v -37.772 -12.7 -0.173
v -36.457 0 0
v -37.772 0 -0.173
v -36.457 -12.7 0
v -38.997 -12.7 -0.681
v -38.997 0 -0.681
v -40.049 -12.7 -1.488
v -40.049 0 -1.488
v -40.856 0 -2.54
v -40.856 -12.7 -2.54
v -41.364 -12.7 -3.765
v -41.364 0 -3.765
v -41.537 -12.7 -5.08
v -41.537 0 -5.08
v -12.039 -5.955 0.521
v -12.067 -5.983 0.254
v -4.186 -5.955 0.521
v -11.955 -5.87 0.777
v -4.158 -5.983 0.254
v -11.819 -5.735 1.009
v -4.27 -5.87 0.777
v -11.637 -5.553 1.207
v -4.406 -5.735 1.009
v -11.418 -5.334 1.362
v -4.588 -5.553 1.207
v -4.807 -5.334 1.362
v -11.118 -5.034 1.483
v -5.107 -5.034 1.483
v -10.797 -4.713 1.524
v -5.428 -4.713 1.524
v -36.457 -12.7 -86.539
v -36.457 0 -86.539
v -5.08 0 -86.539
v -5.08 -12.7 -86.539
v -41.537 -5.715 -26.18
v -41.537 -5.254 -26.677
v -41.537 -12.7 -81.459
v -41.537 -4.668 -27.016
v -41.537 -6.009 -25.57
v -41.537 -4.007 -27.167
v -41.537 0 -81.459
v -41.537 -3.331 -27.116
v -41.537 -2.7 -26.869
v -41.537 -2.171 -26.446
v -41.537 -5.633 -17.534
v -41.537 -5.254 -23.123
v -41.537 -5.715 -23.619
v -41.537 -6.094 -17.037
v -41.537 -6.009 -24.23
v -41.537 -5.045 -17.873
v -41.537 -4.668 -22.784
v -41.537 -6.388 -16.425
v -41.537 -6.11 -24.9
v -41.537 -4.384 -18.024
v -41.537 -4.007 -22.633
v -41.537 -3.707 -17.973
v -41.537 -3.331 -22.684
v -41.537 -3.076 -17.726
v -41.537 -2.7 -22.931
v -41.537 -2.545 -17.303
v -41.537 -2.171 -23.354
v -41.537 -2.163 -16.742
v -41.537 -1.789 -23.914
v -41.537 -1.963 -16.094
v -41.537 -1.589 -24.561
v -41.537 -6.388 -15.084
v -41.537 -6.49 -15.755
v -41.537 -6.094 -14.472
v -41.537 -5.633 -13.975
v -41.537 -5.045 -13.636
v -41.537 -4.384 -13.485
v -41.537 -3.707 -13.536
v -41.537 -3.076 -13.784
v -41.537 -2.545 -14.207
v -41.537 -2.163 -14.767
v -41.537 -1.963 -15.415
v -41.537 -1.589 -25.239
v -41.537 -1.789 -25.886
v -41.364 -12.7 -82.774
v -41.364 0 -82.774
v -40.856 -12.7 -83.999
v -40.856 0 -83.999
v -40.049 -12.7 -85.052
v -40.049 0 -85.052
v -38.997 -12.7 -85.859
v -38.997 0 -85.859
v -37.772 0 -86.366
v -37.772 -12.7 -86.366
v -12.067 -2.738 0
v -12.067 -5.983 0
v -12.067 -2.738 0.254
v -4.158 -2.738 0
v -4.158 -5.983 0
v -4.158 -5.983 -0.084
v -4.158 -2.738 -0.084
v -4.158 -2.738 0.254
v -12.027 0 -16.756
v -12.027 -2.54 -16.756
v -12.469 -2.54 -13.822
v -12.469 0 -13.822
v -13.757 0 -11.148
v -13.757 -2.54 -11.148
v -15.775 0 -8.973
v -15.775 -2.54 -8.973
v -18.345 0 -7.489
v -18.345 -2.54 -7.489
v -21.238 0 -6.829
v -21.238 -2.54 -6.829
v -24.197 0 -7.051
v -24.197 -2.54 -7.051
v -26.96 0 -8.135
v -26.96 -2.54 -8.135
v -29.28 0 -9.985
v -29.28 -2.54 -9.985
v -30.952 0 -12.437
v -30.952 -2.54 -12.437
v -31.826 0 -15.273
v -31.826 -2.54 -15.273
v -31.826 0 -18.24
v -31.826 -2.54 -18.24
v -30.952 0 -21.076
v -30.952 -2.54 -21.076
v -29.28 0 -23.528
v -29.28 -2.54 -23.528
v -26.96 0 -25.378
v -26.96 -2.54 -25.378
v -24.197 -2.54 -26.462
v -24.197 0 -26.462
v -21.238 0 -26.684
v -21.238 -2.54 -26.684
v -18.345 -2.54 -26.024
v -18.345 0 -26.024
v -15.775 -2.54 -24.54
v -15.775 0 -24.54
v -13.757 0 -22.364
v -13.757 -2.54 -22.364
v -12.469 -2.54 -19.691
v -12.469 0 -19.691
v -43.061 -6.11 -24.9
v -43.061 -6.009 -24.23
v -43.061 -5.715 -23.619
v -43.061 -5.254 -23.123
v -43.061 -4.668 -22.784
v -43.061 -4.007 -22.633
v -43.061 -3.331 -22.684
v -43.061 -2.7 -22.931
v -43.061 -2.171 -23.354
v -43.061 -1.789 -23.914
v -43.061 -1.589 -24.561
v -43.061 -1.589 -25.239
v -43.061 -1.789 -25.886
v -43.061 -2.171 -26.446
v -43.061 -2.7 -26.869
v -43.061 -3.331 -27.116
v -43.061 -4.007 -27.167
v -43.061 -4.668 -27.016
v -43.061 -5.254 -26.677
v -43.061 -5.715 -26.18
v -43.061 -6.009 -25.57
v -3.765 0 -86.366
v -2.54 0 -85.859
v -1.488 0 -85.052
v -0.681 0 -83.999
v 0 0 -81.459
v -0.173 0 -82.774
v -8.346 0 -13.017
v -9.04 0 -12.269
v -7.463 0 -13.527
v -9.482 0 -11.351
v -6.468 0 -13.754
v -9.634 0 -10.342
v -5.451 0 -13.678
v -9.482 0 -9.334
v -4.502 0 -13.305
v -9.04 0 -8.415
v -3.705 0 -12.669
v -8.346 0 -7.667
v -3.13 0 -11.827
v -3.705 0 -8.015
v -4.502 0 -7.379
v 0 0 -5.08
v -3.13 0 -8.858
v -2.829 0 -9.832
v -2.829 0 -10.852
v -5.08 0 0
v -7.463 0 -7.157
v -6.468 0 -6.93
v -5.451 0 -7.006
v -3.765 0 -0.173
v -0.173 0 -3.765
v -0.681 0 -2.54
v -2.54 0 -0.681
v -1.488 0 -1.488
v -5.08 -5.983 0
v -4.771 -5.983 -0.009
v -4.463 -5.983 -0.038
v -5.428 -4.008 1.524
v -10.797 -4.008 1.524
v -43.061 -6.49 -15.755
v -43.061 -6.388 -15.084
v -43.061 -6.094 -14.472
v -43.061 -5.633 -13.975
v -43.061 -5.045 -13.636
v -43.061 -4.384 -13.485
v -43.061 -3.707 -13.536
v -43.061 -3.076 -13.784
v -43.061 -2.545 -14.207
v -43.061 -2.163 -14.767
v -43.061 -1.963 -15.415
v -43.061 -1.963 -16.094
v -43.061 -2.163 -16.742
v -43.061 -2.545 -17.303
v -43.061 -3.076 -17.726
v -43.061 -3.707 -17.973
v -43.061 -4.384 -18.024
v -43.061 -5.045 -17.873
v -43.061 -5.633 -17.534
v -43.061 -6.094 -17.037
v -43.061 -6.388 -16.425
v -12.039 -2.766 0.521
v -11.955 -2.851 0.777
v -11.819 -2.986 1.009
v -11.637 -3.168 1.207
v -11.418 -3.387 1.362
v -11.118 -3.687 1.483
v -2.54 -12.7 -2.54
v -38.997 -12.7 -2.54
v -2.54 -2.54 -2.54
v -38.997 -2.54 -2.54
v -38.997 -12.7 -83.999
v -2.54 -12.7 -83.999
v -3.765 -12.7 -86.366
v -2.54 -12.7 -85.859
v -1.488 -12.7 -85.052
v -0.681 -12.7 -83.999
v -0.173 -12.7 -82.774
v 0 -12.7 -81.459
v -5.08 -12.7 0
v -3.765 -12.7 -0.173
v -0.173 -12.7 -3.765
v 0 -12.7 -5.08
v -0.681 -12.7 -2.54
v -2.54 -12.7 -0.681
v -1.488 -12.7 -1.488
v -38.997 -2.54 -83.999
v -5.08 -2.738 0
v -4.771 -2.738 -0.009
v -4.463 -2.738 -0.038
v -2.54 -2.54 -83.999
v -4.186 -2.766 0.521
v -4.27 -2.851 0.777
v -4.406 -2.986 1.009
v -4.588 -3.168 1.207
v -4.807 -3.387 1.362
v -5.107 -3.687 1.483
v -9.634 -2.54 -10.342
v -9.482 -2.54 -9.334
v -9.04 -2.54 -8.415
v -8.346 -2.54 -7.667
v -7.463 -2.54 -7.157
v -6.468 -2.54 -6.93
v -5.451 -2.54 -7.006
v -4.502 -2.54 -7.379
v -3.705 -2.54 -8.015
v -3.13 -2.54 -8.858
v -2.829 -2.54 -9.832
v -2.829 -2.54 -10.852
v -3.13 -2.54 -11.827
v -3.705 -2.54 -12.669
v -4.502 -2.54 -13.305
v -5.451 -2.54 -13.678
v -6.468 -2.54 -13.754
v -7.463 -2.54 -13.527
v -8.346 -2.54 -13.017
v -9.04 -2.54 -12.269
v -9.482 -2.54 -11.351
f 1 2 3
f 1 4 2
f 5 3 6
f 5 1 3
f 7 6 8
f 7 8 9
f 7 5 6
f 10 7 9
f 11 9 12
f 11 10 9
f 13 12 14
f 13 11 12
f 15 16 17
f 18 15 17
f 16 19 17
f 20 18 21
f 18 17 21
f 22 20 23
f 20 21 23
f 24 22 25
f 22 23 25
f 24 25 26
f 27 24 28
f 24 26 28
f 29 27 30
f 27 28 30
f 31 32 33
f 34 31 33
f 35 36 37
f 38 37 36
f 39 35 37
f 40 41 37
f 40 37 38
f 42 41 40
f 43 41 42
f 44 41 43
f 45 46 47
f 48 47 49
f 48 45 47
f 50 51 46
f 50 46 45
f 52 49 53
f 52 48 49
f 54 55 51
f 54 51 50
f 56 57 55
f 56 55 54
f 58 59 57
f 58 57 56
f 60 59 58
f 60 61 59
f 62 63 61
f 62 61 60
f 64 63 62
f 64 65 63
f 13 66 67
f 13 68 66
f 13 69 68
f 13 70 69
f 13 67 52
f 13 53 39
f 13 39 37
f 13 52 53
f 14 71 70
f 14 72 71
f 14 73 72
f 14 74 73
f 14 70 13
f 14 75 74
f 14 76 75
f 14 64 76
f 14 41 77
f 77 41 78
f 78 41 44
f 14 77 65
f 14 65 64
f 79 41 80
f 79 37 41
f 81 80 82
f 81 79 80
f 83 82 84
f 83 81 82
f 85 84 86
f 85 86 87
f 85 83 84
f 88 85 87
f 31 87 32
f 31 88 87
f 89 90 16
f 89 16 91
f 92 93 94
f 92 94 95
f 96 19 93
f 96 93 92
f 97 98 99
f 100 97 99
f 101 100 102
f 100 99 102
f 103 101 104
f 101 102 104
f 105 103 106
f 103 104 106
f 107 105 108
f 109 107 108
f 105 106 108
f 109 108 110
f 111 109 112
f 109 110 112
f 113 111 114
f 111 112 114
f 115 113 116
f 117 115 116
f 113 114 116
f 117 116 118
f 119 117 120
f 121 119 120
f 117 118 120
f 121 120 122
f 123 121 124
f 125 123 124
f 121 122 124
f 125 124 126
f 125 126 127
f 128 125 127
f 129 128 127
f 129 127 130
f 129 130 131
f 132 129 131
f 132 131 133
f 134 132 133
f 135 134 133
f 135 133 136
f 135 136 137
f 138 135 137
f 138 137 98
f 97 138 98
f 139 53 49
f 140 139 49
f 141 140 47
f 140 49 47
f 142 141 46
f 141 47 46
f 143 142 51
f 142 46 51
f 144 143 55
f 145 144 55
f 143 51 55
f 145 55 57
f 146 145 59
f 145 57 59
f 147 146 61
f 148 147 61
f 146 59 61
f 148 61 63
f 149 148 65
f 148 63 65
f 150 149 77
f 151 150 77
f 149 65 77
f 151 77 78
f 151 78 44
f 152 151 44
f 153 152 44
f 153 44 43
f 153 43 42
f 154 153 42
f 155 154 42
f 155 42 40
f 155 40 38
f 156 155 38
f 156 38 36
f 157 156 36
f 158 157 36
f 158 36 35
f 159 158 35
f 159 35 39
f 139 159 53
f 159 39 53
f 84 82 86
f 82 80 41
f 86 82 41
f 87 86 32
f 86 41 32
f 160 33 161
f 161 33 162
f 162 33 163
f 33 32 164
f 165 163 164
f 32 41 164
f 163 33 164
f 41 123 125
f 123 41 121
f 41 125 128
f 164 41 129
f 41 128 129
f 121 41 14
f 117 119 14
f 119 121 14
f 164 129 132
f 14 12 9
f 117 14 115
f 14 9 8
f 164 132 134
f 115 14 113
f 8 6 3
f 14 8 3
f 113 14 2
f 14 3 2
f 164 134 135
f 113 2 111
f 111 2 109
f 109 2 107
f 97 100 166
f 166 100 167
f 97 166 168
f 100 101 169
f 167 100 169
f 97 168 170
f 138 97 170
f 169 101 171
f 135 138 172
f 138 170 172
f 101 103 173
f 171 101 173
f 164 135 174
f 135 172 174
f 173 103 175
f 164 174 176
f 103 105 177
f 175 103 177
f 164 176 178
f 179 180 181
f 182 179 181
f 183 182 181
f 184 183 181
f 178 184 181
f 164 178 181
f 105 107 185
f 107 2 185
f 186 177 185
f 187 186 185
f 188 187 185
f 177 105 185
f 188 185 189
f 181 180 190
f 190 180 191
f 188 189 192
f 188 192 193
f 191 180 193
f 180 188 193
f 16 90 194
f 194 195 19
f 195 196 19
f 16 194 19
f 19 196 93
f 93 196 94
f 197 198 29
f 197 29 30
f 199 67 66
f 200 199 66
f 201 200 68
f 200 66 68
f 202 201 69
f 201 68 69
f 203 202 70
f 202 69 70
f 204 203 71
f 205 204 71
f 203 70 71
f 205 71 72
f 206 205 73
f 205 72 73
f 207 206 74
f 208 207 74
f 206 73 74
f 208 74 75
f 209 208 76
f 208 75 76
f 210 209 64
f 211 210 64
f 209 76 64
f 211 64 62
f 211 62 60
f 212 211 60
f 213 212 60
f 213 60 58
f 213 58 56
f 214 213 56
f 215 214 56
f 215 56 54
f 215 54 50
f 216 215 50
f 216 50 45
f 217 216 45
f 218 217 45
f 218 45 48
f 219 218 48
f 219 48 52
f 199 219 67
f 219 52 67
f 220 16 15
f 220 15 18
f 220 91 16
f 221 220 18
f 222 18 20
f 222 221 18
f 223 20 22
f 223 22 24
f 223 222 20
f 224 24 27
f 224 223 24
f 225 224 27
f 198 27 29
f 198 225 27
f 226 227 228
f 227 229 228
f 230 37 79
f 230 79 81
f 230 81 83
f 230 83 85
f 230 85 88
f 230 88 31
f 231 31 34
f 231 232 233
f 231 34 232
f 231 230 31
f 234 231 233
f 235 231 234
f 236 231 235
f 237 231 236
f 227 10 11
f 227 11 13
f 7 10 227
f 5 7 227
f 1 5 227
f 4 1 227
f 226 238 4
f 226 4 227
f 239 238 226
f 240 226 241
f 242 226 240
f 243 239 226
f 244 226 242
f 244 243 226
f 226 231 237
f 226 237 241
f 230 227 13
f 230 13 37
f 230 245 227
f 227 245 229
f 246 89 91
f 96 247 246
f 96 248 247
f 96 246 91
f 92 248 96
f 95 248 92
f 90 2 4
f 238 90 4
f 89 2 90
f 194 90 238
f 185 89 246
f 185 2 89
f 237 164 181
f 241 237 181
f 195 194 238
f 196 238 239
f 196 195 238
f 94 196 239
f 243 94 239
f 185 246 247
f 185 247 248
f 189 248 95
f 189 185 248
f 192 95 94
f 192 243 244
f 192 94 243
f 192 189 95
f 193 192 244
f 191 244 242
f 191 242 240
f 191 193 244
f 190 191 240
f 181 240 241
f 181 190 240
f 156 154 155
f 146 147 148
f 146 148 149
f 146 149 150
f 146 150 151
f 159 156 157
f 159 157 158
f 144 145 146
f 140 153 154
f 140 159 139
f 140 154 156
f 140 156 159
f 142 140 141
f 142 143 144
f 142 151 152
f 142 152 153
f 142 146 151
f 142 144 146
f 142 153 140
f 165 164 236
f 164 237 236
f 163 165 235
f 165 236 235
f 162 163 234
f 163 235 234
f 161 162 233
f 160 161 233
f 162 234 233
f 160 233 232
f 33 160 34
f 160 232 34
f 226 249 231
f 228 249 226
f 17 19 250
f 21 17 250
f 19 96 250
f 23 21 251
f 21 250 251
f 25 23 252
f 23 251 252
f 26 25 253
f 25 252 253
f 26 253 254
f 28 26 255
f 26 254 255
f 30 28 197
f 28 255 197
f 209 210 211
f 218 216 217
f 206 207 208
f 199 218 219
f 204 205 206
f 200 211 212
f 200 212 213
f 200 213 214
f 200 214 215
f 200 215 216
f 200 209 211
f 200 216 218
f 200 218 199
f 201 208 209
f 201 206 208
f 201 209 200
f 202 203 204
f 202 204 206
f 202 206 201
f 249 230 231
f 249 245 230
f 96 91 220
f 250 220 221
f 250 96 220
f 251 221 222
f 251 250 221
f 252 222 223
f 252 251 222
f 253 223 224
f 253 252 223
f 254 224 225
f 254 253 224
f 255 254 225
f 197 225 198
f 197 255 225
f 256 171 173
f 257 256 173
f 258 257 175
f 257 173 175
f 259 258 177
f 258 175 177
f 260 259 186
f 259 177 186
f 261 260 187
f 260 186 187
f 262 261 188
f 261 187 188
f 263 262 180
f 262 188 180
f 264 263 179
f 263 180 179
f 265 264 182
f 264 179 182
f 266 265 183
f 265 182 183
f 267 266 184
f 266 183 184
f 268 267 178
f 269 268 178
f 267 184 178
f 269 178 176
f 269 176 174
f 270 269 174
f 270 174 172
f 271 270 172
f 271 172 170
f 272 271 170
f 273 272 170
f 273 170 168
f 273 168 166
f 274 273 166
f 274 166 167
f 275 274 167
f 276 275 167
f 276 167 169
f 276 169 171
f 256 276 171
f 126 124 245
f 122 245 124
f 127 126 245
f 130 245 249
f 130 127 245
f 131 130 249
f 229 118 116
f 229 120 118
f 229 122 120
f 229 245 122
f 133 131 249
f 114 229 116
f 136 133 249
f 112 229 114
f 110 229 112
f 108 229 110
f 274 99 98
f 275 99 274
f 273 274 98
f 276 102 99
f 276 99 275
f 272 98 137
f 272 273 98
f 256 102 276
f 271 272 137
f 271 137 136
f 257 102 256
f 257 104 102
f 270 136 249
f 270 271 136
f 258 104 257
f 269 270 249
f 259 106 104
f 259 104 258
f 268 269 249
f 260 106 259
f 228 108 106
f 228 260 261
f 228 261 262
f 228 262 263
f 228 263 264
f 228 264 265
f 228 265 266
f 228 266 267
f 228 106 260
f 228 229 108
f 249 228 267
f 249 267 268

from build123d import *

# Parameters (mm, degrees)
F0_W          = 41.536912322
F0_H          = 86.5394547582
F1_DEPTH      = 12.7
F2_T          = -2.54
F3_R          = 2.2759132083
F5_DEPTH      = 1.524
F4_R          = 2.2733
F6_DEPTH      = 1.524
F7_W          = 7.9097328708
F7_H          = 3.2450191211
F8_DEPTH      = 1.524
F9_R          = 1.27
F10_R         = 5.08
F11_R         = 5.08
F12_T4_DEPTH  = 38.1
F12_T10_DEPTH = 38.1
F12_T16_DEPTH = 38.1
F12_T23_DEPTH = 38.1
F12_T29_DEPTH = 38.1
F13_R         = 5.08
F14_R         = 3.4214532803
F15_DEPTH     = 37.77729
F16_R         = 9.955312615
F17_DEPTH     = 26.73123


# Not quite as in the source:
# - a fillet or chamfer that OpenCascade refuses, or shapes differently, is made with other operations: its cross-section is extruded or revolved along the edge and cut away or added


with BuildPart() as f1:
    # F0 (on Front) → F1 (new body)
    with BuildSketch(Plane.XZ):
        with Locations((-20.768456161, -43.2697273791)):
            Rectangle(F0_W, F0_H)
    extrude(amount=F1_DEPTH)

    # F2
    f2_openings = [f1.faces().sort_by_distance(p)[0] for p in [
        (-20.768456, -12.7, -43.269727),
    ]]
    offset(amount=F2_T, openings=f2_openings)

    # F3 (on face) → F5 (join)
    with BuildSketch(Plane(origin=(-41.536912322, 0, 0), x_dir=(0, -1, 0), z_dir=(-1, 0, 0))):
        with Locations((4.2136539705, -15.7545246184)):
            Circle(F3_R)
    extrude(amount=F5_DEPTH)

    # F4 (on face) → F6 (join)
    with BuildSketch(Plane(origin=(-41.536912322, 0, 0), x_dir=(0, -1, 0), z_dir=(-1, 0, 0))):
        with Locations((3.8371200208, -24.8998850584)):
            Circle(F4_R)
    extrude(amount=F6_DEPTH)

    # F7 (on face) → F8 (join)
    with BuildSketch(Plane.XY):
        with Locations((-8.1125465222, -4.3604943203)):
            Rectangle(F7_W, F7_H)
    extrude(amount=F8_DEPTH)

    # F9
    f9_edges = [f1.edges().sort_by_distance(p)[0] for p in [
        (-8.112547, -2.737985, 1.524),
        (-12.067413, -4.360494, 1.524),
        (-8.112547, -5.983004, 1.524),
        (-4.15768, -4.360494, 1.524),
    ]]
    fillet(f9_edges, radius=F9_R)

    # F10
    f10_edges = [f1.edges().sort_by_distance(p)[0] for p in [
        (-41.536912, -6.35, 0),
    ]]
    fillet(f10_edges, radius=F10_R)

    # F11
    f11_edges = [f1.edges().sort_by_distance(p)[0] for p in [
        (-41.536912, -6.35, -86.539455),
    ]]
    fillet(f11_edges, radius=F11_R)

    # F12: fillet of radius 5.08 on 1 edges, made by hand


with BuildPart() as f12_tool2:
    # F12_s3 → F12_t4 (new body)
    with BuildSketch(Plane.XZ.offset(-12.7)):
        with BuildLine():
            ThreePointArc((-5.08, 0), (-1.4878975516, -1.4878975516), (0, -5.08))
            Line((0, -5.08), (0, 0))
            Line((0, 0), (-5.08, 0))
        make_face()
    extrude(amount=F12_T4_DEPTH)

    split(bisect_by=Plane.YZ.offset(-4.1576800868), keep=Keep.BOTTOM)

    split(bisect_by=Plane.XZ.offset(2.7379847597), keep=Keep.BOTTOM)


with BuildPart() as f1_1:
    add(f1.part)

    # F12_t1: cut F12_tool2
    add(f12_tool2.part, mode=Mode.SUBTRACT)


with BuildPart() as f12_tool8:
    # F12_s9 → F12_t10 (new body)
    with BuildSketch(Plane.XZ.offset(-12.7)):
        with BuildLine():
            ThreePointArc((-5.08, 0), (-1.4878975516, -1.4878975516), (0, -5.08))
            Line((0, -5.08), (0, 0))
            Line((0, 0), (-5.08, 0))
        make_face()
    extrude(amount=F12_T10_DEPTH)

    split(bisect_by=Plane.YZ.offset(-4.1576800868), keep=Keep.TOP)

    split(bisect_by=Plane.XZ.offset(2.7379847597), keep=Keep.BOTTOM)


with BuildPart() as f1_2:
    add(f1_1.part)

    # F12_t7: cut F12_tool8
    add(f12_tool8.part, mode=Mode.SUBTRACT)


with BuildPart() as f12_tool14:
    # F12_s15 → F12_t16 (new body)
    with BuildSketch(Plane.XZ.offset(-12.7)):
        with BuildLine():
            ThreePointArc((-5.08, 0), (-1.4878975516, -1.4878975516), (0, -5.08))
            Line((0, -5.08), (0, 0))
            Line((0, 0), (-5.08, 0))
        make_face()
    extrude(amount=F12_T16_DEPTH)

    split(bisect_by=Plane.YZ.offset(-4.1576800868), keep=Keep.TOP)

    split(bisect_by=Plane.XZ.offset(5.9830038808), keep=Keep.BOTTOM)

    split(bisect_by=Plane.XZ.offset(2.7379847597), keep=Keep.TOP)


with BuildPart() as f1_3:
    add(f1_2.part)

    # F12_t13: cut F12_tool14
    add(f12_tool14.part, mode=Mode.SUBTRACT)


with BuildPart() as f12_tool21:
    # F12_s22 → F12_t23 (new body)
    with BuildSketch(Plane.XZ.offset(-12.7)):
        with BuildLine():
            ThreePointArc((-5.08, 0), (-1.4878975516, -1.4878975516), (0, -5.08))
            Line((0, -5.08), (0, 0))
            Line((0, 0), (-5.08, 0))
        make_face()
    extrude(amount=F12_T23_DEPTH)

    split(bisect_by=Plane.YZ.offset(-4.1576800868), keep=Keep.BOTTOM)

    split(bisect_by=Plane.XZ.offset(5.9830038808), keep=Keep.TOP)


with BuildPart() as f1_4:
    add(f1_3.part)

    # F12_t20: cut F12_tool21
    add(f12_tool21.part, mode=Mode.SUBTRACT)


with BuildPart() as f12_tool27:
    # F12_s28 → F12_t29 (new body)
    with BuildSketch(Plane.XZ.offset(-12.7)):
        with BuildLine():
            ThreePointArc((-5.08, 0), (-1.4878975516, -1.4878975516), (0, -5.08))
            Line((0, -5.08), (0, 0))
            Line((0, 0), (-5.08, 0))
        make_face()
    extrude(amount=F12_T29_DEPTH)

    split(bisect_by=Plane.YZ.offset(-4.1576800868), keep=Keep.TOP)

    split(bisect_by=Plane.XZ.offset(5.9830038808), keep=Keep.TOP)


with BuildPart() as f1_5:
    add(f1_4.part)

    # F12_t26: cut F12_tool27
    add(f12_tool27.part, mode=Mode.SUBTRACT)

    # F13
    f13_edges = [f1_5.edges().sort_by_distance(p)[0] for p in [
        (0, -6.35, -86.539455),
    ]]
    fillet(f13_edges, radius=F13_R)

    # F14 (on face) → F15 (cut)
    with BuildSketch(Plane(origin=(0, 0, 0), x_dir=(-1, 0, 0), z_dir=(0, 1, 0))):
        with Locations((6.212700624, -10.3420317173)):
            Circle(F14_R)
    extrude(amount=-F15_DEPTH, mode=Mode.SUBTRACT)

    # F16 (on face) → F17 (cut)
    with BuildSketch(Plane.XZ.offset(2.54)):
        with Locations((-21.9822023064, -16.7564060539)):
            Circle(F16_R)
    extrude(amount=-F17_DEPTH, mode=Mode.SUBTRACT)


solid = f1_5.part
